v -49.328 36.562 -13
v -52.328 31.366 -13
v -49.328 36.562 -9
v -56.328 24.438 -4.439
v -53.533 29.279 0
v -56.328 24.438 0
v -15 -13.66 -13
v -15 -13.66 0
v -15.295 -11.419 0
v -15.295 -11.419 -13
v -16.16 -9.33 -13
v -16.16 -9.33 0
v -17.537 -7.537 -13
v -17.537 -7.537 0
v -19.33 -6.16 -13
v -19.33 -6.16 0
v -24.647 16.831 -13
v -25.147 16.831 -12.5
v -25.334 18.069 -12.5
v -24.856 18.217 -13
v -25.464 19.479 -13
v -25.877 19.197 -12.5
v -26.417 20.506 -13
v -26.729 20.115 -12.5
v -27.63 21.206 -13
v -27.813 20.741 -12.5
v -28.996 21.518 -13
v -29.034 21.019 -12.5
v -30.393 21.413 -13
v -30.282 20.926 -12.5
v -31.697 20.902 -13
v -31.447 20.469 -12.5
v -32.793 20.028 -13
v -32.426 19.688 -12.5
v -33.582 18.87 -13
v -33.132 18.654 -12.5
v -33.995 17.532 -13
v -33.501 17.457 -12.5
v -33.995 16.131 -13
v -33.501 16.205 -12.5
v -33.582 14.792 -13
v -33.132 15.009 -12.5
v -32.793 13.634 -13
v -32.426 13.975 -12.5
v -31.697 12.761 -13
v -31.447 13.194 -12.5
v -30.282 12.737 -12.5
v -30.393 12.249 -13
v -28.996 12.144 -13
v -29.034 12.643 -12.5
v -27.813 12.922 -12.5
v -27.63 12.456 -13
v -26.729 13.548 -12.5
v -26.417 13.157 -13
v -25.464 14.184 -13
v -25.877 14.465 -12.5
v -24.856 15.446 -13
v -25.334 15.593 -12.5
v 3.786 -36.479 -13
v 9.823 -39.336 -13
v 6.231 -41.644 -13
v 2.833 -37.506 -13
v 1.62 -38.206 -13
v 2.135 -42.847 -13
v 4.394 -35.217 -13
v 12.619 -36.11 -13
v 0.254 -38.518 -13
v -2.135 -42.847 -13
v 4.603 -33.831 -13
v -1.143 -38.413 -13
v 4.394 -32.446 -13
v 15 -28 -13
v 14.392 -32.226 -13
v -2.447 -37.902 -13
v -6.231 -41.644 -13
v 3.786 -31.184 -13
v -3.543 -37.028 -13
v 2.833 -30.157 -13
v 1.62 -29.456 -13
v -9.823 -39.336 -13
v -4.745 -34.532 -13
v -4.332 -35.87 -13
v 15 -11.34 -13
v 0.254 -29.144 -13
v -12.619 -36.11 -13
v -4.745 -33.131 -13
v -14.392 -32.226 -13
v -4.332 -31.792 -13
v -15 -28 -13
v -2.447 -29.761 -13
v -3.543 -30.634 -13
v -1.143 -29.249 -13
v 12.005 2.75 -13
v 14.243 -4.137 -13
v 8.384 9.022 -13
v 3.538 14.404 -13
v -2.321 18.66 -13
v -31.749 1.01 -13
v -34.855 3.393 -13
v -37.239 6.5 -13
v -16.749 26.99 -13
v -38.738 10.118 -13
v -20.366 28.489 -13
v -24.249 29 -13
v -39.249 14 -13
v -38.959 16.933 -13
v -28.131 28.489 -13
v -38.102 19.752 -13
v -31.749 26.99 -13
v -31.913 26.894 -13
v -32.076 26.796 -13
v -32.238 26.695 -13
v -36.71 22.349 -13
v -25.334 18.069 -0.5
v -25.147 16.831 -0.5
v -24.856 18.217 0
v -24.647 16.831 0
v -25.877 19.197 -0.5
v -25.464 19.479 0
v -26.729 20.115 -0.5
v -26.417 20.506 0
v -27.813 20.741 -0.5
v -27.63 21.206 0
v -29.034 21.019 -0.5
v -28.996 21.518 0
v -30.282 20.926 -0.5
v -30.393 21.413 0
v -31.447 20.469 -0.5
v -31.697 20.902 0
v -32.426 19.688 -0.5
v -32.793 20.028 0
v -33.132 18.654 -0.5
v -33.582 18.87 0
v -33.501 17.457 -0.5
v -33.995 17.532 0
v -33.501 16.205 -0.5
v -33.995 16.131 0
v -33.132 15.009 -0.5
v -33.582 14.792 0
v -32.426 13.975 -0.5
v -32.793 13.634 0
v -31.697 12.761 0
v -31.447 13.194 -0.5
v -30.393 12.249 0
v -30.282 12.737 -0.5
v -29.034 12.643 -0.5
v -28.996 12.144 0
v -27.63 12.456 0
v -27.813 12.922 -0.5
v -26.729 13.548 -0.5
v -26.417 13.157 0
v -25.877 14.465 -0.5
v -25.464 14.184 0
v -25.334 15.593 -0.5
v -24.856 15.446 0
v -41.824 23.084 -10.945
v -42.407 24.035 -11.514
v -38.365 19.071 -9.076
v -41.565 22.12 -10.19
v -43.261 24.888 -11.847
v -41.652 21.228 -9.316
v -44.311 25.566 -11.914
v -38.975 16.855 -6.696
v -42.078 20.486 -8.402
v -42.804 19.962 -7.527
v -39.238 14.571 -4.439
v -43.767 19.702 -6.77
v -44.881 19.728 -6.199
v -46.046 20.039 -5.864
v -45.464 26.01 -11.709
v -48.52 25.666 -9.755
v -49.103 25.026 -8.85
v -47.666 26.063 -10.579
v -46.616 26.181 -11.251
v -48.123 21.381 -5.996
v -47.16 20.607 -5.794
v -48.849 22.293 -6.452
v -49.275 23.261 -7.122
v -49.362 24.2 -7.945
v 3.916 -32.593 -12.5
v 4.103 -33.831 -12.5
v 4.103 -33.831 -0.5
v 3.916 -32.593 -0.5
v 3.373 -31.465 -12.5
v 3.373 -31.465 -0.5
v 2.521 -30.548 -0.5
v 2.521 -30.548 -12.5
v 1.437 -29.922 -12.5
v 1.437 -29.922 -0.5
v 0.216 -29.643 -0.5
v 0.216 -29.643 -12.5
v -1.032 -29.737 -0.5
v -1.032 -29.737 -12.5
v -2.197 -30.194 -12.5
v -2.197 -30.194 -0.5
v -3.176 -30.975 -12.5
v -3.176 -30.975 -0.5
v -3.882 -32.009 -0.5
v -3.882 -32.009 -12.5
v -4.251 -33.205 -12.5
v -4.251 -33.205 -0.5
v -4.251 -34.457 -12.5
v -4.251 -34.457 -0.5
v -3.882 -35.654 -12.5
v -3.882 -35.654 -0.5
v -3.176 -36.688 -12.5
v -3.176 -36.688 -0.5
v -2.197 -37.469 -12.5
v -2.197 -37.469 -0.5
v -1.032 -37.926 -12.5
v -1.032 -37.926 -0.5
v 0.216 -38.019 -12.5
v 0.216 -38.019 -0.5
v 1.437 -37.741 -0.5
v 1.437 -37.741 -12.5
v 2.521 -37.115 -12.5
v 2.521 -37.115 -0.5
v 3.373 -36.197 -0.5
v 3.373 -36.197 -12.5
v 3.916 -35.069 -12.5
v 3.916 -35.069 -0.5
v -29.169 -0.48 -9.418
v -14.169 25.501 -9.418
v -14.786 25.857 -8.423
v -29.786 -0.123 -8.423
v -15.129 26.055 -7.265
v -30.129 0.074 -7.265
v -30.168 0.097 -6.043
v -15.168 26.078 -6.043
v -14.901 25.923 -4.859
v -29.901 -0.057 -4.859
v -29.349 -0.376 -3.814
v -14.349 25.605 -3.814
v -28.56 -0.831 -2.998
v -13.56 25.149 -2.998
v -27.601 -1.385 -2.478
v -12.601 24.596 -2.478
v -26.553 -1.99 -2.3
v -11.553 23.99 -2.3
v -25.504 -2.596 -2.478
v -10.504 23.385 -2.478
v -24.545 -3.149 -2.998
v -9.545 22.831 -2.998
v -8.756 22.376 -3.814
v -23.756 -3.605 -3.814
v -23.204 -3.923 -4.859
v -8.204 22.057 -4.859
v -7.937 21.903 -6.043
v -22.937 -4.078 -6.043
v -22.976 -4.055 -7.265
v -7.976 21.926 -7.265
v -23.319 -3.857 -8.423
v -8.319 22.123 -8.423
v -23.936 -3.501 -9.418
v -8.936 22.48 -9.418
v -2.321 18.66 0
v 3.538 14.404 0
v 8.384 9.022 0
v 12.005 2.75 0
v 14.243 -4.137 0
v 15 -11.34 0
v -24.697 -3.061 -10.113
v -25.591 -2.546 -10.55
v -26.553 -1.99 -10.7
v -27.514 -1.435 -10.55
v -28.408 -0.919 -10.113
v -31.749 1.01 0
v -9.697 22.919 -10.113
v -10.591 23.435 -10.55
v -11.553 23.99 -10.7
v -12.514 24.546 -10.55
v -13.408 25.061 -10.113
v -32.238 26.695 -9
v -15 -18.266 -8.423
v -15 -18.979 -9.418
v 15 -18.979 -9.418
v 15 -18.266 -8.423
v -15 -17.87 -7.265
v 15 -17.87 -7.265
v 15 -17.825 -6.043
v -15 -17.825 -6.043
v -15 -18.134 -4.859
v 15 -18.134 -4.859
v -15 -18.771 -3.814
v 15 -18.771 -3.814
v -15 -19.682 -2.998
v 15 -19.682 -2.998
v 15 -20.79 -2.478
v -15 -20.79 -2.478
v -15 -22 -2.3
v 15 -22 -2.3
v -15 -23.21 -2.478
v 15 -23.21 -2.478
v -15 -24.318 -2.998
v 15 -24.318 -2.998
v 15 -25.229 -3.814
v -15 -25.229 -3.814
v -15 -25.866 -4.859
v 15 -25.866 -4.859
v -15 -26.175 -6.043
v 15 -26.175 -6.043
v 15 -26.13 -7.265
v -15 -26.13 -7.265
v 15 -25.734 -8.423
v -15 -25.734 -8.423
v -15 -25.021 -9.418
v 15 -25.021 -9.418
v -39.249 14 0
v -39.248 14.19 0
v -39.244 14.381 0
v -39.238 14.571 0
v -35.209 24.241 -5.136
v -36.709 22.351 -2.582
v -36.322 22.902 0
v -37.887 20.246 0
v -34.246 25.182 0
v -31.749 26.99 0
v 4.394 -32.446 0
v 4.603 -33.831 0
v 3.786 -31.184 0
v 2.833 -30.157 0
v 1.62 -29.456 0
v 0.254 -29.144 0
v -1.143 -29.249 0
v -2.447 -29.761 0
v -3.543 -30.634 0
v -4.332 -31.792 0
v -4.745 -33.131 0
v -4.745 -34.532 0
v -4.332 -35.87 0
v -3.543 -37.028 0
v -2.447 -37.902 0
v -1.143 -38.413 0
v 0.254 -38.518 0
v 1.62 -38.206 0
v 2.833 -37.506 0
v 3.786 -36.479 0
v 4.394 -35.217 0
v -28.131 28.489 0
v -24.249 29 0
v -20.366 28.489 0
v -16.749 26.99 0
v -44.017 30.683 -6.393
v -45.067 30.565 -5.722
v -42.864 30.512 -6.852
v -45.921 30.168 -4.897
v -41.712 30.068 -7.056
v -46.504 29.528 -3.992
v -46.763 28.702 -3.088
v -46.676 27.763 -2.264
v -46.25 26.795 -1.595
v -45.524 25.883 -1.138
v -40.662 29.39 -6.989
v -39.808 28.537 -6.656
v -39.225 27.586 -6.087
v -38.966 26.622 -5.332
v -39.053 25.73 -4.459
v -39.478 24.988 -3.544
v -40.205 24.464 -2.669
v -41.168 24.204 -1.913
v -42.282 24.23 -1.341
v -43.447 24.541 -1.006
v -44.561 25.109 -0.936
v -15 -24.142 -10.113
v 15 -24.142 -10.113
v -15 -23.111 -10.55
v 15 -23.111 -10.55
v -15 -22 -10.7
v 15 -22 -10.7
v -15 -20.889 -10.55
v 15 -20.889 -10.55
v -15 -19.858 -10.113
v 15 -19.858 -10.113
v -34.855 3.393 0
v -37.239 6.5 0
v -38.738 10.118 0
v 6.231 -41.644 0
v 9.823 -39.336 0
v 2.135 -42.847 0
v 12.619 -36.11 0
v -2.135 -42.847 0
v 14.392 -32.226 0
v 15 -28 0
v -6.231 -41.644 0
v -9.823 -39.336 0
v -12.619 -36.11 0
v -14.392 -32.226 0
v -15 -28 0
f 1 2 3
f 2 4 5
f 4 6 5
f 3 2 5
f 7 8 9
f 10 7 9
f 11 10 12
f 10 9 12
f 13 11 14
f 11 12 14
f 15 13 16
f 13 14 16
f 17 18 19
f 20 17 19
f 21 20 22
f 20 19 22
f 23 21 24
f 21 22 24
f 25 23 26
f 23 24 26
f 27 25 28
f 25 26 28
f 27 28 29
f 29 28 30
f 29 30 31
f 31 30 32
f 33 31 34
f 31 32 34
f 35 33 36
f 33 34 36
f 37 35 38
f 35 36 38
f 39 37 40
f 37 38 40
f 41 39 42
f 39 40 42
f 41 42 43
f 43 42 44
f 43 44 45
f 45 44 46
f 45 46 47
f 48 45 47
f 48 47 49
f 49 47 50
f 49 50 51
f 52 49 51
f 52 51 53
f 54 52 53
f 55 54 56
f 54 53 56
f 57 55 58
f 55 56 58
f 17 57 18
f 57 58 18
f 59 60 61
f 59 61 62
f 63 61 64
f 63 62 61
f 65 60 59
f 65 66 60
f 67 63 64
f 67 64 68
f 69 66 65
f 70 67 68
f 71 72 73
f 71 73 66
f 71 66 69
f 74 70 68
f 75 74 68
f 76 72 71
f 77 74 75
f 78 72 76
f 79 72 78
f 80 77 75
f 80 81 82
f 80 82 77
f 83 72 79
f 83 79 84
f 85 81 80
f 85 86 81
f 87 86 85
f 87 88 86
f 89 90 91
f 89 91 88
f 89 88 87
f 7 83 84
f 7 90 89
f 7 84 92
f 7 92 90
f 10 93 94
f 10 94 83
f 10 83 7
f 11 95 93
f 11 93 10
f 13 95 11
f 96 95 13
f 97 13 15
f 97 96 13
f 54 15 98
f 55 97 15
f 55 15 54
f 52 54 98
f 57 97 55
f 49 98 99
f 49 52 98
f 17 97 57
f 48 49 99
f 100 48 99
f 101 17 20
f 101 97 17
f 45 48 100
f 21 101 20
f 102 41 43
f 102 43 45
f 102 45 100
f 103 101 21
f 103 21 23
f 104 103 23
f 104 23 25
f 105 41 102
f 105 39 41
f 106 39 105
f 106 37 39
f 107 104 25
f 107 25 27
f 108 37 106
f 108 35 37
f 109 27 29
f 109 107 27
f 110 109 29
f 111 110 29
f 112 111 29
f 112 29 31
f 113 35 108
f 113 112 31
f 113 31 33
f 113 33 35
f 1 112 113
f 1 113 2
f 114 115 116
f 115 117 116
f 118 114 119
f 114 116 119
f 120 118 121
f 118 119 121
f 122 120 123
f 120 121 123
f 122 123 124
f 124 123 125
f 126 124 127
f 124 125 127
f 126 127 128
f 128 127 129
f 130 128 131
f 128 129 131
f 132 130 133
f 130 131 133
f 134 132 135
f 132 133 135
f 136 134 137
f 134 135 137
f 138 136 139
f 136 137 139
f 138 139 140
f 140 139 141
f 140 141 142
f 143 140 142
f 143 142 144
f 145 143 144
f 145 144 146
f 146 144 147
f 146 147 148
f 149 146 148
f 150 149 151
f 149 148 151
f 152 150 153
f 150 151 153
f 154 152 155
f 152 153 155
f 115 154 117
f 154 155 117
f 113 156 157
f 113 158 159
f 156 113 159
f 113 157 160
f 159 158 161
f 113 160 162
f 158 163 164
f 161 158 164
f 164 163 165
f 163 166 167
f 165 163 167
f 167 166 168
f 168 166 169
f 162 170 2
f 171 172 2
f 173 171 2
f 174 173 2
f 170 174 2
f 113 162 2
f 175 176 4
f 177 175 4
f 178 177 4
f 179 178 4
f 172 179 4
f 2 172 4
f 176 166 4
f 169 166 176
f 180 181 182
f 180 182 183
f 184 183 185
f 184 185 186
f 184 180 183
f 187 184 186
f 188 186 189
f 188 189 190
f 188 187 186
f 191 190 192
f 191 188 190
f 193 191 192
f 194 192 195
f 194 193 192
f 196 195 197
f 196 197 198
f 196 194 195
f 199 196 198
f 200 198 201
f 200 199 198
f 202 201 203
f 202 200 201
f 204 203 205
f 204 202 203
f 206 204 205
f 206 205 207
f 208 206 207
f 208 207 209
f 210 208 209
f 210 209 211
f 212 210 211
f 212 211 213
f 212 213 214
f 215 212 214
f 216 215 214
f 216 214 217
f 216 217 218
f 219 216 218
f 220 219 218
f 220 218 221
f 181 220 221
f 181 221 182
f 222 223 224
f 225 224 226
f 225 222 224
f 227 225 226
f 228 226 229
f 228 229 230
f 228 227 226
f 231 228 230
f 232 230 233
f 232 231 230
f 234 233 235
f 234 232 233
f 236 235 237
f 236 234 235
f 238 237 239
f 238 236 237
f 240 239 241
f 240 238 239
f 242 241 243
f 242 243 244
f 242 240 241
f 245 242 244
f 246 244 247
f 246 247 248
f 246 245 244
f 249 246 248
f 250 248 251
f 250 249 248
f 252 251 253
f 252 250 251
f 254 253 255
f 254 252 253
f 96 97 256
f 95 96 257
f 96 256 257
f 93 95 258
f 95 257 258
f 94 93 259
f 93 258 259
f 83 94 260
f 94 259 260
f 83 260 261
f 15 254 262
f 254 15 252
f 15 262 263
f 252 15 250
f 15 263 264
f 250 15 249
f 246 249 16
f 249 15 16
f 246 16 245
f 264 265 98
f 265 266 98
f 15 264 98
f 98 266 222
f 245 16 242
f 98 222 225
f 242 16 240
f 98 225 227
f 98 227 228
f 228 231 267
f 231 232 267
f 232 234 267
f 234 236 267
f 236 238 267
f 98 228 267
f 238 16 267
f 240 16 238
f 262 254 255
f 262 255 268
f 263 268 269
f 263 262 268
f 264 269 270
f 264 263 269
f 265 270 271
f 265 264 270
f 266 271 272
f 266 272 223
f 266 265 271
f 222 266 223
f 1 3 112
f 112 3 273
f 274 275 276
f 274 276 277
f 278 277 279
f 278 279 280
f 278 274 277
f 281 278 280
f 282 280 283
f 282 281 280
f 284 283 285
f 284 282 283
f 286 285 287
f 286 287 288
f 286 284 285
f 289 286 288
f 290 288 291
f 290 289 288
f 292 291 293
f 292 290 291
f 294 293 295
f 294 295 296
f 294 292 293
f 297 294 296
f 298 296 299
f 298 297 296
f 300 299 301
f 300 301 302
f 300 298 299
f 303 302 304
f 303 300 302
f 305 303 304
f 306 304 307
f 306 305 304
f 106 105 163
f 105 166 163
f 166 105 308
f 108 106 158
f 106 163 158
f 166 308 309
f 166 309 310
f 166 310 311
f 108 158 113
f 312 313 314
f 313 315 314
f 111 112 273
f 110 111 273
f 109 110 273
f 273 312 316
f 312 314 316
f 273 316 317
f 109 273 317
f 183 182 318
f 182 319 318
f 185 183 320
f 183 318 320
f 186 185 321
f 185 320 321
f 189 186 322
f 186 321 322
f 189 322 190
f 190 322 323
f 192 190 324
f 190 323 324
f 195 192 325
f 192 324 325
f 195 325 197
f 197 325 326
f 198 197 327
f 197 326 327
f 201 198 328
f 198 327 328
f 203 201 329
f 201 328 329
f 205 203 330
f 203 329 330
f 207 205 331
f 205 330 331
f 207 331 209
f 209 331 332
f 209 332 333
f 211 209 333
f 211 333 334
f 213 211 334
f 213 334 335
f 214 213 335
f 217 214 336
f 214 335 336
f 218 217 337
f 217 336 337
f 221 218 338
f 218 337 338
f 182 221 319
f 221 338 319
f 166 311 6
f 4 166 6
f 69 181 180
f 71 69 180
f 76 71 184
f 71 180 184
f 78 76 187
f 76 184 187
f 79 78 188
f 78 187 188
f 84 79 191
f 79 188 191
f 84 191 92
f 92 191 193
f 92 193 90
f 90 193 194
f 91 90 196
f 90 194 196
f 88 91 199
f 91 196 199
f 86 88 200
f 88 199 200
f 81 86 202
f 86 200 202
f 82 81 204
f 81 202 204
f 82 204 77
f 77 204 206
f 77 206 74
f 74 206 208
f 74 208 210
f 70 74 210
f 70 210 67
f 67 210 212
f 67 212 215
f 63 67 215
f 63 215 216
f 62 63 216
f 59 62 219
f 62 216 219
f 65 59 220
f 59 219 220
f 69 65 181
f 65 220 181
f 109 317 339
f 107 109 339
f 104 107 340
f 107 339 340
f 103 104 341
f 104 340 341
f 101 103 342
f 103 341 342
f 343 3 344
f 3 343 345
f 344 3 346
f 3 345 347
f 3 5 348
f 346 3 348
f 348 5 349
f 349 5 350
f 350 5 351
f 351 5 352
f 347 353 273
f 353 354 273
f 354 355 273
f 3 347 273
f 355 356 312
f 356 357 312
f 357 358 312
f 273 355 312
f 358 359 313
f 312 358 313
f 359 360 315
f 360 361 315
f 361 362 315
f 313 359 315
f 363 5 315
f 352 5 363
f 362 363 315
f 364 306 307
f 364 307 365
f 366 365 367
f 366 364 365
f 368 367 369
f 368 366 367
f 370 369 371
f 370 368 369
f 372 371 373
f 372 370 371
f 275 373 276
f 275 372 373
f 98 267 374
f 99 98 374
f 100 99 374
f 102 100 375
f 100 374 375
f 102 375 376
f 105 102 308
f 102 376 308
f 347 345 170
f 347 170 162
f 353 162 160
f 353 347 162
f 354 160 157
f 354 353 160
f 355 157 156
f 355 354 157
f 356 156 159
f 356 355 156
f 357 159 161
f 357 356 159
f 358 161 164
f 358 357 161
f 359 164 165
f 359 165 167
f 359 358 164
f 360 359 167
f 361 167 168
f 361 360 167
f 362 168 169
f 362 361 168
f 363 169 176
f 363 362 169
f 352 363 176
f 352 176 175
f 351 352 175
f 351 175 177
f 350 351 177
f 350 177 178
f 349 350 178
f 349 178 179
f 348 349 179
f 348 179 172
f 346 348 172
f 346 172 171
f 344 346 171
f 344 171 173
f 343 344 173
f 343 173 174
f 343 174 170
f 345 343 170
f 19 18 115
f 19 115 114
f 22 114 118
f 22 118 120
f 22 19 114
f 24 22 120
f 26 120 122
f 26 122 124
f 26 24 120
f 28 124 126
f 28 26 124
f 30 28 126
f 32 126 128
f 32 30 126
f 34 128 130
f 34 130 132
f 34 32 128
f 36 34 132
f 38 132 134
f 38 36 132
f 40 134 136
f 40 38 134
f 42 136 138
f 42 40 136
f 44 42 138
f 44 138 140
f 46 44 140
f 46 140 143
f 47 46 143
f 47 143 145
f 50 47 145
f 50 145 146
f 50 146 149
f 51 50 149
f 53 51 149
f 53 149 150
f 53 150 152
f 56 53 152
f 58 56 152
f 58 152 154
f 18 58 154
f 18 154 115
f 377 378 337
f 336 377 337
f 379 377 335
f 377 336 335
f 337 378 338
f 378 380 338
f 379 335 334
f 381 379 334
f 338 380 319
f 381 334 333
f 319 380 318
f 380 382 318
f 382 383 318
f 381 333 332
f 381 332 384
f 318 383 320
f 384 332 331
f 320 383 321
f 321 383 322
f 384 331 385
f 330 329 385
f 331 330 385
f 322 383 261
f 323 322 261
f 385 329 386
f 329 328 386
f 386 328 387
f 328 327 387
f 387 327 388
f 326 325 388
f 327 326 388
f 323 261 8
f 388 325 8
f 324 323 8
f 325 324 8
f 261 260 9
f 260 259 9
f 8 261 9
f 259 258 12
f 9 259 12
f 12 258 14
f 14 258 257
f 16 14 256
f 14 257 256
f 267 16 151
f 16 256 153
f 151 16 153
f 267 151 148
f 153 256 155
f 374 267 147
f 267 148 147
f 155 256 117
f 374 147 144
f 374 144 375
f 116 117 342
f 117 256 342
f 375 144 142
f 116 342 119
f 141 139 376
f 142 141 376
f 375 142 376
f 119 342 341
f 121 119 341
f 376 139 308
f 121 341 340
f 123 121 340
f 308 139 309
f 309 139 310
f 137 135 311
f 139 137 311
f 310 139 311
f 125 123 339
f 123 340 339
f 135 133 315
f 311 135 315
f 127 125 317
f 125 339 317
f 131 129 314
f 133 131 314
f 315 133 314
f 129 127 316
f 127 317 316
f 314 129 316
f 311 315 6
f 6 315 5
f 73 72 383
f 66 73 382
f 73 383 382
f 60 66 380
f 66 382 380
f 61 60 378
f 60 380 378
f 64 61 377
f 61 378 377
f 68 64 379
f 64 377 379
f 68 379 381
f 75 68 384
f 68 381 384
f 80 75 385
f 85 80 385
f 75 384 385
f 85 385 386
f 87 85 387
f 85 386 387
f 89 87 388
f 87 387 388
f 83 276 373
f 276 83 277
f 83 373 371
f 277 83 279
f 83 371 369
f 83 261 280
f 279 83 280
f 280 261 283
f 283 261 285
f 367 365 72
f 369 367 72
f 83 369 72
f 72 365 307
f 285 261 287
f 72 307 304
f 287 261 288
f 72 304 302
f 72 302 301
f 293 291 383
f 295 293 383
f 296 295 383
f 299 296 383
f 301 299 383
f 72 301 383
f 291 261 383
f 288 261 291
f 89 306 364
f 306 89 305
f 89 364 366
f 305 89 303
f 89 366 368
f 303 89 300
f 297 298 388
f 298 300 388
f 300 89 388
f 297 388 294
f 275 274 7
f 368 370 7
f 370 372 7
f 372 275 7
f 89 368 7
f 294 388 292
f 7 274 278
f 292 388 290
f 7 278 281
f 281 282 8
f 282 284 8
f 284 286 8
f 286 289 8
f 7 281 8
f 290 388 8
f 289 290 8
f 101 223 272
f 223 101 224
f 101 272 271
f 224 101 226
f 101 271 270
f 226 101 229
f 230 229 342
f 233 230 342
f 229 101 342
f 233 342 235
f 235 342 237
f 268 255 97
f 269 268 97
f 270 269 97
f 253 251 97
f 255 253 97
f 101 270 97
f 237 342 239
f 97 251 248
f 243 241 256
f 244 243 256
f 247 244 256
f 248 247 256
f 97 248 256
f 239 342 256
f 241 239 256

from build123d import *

# Parameters (mm, degrees)
BOSS_EXTRUDE1_DEPTH        = 13
CUT_EXTRUDE1_DEPTH         = 71.771362109
CUT_EXTRUDE2_DEPTH         = 62.040693778
F_8_4_8_4_DIAMETER_HOLE1_D = 8.4
CHAMFER2_SIZE              = 9
CHAMFER2_SIZE2             = 8.410167494
CHAMFER3_SIZE              = 8
CHAMFER3_SIZE2             = 8.56106612
SKETCH11_R                 = 4.2
CUT_EXTRUDE5_DEPTH         = 10
CHAMFER4_SIZE              = 0.5
SKETCH12_W                 = 893.834484117
SKETCH12_H                 = 134.722779032
CUT_EXTRUDE6_DEPTH         = 73.047156948


with BuildPart() as part:
    # Sketch1 → Boss-Extrude1 (new body)
    with BuildSketch(Plane(origin=(0, 0, 0), x_dir=(-1, 0, 0), z_dir=(0, 0, -1))):
        with BuildLine():
            Line((-14.999999535, -11.339745693), (-14.999999535, -27.999999731))
            ThreePointArc((-14.999999535, -27.999999731), (4.65e-07, -42.999999731), (15.000000465, -27.999999731))
            Line((15.000000465, -27.999999731), (15.000000465, -13.660253769))
            ThreePointArc((15.000000465, -13.660253769), (16.160254503, -9.33012675), (19.330127484, -6.160253769))
            Line((19.330127484, -6.160253769), (31.748711306, 1.009618943))
            ThreePointArc((31.748711306, 1.009618943), (37.239092363, 6.5), (39.248711306, 14))
            ThreePointArc((39.248711306, 14), (39.245992383, 14.285587643), (39.237836599, 14.571071754))
            Line((39.237836599, 14.571071754), (56.327549631, 24.437822174))
            Line((56.327549631, 24.437822174), (52.827549631, 30.5))
            Line((52.827549631, 30.5), (49.327549631, 36.562177826))
            Line((49.327549631, 36.562177826), (32.237836599, 26.695427407))
            ThreePointArc((32.237836599, 26.695427407), (31.994677998, 26.845232579), (31.748711306, 26.990381057))
            ThreePointArc((31.748711306, 26.990381057), (24.248711306, 29), (16.748711306, 26.990381057))
            Line((16.748711306, 26.990381057), (2.320508541, 18.660254307))
            ThreePointArc((2.320508541, 18.660254307), (-10.358983383, 5.980762382), (-14.999999535, -11.339745693))
        make_face()
    extrude(amount=-BOSS_EXTRUDE1_DEPTH)

    # Sketch2 → Cut-Extrude1 (cut, through all)
    with BuildSketch(Plane(origin=(-7.5, -12.990381057, 0), x_dir=(0.8660254037844388, -0.4999999999999997, 0), z_dir=(-0.4999999999999997, -0.8660254037844388, 0))):
        with BuildLine():
            ThreePointArc((-25.021227161, 9.417565156), (-22, 2.3), (-18.978772839, 9.417565156))
            ThreePointArc((-18.978772839, 9.417565156), (-22, 10.7), (-25.021227161, 9.417565156))
        make_face()
    extrude(amount=-CUT_EXTRUDE1_DEPTH, mode=Mode.SUBTRACT)

    # Sketch3 → Cut-Extrude2 (cut, through all)
    with BuildSketch(Plane.ZY.offset(15.000000465)):
        with BuildLine():
            ThreePointArc((9.417565156, -18.978772839), (2.3, -22), (9.417565156, -25.021227161))
            ThreePointArc((9.417565156, -25.021227161), (10.7, -22), (9.417565156, -18.978772839))
        make_face()
    extrude(amount=-CUT_EXTRUDE2_DEPTH, mode=Mode.SUBTRACT)

    # Ø8.4 (8.4) Diameter Hole1 (through all)
    with Locations(Plane(origin=(0, 0, 0), x_dir=(-1, 0, 0), z_dir=(0, 0, -1))):
        with Locations((29.347432097, 16.831243464), (0.097432097, -33.831242658)):
            Hole(F_8_4_8_4_DIAMETER_HOLE1_D / 2)

    # Chamfer2
    chamfer2_edges = [part.edges().sort_by_distance(p)[0] for p in [
        (-40.782693115, 31.628802617, 0),
    ]]
    chamfer2_side = [part.faces().sort_by_distance(p)[0] for p in [
        (-40.782693115, 31.628802617, 6.5),
    ]]
    chamfer(chamfer2_edges, length=CHAMFER2_SIZE, length2=CHAMFER2_SIZE2, reference=chamfer2_side[0])

    # Chamfer3
    chamfer3_edges = [part.edges().sort_by_distance(p)[0] for p in [
        (-47.782693115, 19.504446964, 13),
    ]]
    chamfer3_side = [part.faces().sort_by_distance(p)[0] for p in [
        (-11.809669845, -1.389258466, 13),
    ]]
    chamfer(chamfer3_edges, length=CHAMFER3_SIZE, length2=CHAMFER3_SIZE2, reference=chamfer3_side[0])

    # Sketch11 → Cut-Extrude5 (cut)
    with BuildSketch(Plane(origin=(-0.376401755, -0.651946963, 0.703467067), x_dir=(-0.9308491020683198, 0.2544179045973002, -0.2622812974630898), z_dir=(0.36532170182252927, 0.6327557486641282, -0.6827592670260799))):
        with Locations(Location((45.831104576, 22.456070648, 0), (0, 0, 89.523216635))):
            Circle(SKETCH11_R)
    extrude(amount=-CUT_EXTRUDE5_DEPTH, mode=Mode.SUBTRACT)

    # Chamfer4
    chamfer4_edges = [part.edges().sort_by_distance(p)[0] for p in [
        (-4.297432097, -33.831242658, 0),
        (-4.297432097, -33.831242658, 13),
        (-33.547432097, 16.831243464, 0),
        (-33.547432097, 16.831243464, 13),
    ]]
    chamfer(chamfer4_edges, length=CHAMFER4_SIZE)

    # Mirror1: part across plane


with BuildPart() as part_1:
    add(part.part)
    add(part.part.mirror(Plane(origin=(0, 0, 0), x_dir=(1, 0, 0), z_dir=(0, 0, -1))))

    # Sketch12 → Cut-Extrude6 (cut, through all)
    with BuildSketch(Plane(origin=(0, 0, 0), x_dir=(-1, 0, 0), z_dir=(0, 0, -1))):
        with Locations((15.524382534, -0.917202718)):
            Rectangle(SKETCH12_W, SKETCH12_H)
    extrude(amount=-CUT_EXTRUDE6_DEPTH, mode=Mode.SUBTRACT)


solid = part_1.part
